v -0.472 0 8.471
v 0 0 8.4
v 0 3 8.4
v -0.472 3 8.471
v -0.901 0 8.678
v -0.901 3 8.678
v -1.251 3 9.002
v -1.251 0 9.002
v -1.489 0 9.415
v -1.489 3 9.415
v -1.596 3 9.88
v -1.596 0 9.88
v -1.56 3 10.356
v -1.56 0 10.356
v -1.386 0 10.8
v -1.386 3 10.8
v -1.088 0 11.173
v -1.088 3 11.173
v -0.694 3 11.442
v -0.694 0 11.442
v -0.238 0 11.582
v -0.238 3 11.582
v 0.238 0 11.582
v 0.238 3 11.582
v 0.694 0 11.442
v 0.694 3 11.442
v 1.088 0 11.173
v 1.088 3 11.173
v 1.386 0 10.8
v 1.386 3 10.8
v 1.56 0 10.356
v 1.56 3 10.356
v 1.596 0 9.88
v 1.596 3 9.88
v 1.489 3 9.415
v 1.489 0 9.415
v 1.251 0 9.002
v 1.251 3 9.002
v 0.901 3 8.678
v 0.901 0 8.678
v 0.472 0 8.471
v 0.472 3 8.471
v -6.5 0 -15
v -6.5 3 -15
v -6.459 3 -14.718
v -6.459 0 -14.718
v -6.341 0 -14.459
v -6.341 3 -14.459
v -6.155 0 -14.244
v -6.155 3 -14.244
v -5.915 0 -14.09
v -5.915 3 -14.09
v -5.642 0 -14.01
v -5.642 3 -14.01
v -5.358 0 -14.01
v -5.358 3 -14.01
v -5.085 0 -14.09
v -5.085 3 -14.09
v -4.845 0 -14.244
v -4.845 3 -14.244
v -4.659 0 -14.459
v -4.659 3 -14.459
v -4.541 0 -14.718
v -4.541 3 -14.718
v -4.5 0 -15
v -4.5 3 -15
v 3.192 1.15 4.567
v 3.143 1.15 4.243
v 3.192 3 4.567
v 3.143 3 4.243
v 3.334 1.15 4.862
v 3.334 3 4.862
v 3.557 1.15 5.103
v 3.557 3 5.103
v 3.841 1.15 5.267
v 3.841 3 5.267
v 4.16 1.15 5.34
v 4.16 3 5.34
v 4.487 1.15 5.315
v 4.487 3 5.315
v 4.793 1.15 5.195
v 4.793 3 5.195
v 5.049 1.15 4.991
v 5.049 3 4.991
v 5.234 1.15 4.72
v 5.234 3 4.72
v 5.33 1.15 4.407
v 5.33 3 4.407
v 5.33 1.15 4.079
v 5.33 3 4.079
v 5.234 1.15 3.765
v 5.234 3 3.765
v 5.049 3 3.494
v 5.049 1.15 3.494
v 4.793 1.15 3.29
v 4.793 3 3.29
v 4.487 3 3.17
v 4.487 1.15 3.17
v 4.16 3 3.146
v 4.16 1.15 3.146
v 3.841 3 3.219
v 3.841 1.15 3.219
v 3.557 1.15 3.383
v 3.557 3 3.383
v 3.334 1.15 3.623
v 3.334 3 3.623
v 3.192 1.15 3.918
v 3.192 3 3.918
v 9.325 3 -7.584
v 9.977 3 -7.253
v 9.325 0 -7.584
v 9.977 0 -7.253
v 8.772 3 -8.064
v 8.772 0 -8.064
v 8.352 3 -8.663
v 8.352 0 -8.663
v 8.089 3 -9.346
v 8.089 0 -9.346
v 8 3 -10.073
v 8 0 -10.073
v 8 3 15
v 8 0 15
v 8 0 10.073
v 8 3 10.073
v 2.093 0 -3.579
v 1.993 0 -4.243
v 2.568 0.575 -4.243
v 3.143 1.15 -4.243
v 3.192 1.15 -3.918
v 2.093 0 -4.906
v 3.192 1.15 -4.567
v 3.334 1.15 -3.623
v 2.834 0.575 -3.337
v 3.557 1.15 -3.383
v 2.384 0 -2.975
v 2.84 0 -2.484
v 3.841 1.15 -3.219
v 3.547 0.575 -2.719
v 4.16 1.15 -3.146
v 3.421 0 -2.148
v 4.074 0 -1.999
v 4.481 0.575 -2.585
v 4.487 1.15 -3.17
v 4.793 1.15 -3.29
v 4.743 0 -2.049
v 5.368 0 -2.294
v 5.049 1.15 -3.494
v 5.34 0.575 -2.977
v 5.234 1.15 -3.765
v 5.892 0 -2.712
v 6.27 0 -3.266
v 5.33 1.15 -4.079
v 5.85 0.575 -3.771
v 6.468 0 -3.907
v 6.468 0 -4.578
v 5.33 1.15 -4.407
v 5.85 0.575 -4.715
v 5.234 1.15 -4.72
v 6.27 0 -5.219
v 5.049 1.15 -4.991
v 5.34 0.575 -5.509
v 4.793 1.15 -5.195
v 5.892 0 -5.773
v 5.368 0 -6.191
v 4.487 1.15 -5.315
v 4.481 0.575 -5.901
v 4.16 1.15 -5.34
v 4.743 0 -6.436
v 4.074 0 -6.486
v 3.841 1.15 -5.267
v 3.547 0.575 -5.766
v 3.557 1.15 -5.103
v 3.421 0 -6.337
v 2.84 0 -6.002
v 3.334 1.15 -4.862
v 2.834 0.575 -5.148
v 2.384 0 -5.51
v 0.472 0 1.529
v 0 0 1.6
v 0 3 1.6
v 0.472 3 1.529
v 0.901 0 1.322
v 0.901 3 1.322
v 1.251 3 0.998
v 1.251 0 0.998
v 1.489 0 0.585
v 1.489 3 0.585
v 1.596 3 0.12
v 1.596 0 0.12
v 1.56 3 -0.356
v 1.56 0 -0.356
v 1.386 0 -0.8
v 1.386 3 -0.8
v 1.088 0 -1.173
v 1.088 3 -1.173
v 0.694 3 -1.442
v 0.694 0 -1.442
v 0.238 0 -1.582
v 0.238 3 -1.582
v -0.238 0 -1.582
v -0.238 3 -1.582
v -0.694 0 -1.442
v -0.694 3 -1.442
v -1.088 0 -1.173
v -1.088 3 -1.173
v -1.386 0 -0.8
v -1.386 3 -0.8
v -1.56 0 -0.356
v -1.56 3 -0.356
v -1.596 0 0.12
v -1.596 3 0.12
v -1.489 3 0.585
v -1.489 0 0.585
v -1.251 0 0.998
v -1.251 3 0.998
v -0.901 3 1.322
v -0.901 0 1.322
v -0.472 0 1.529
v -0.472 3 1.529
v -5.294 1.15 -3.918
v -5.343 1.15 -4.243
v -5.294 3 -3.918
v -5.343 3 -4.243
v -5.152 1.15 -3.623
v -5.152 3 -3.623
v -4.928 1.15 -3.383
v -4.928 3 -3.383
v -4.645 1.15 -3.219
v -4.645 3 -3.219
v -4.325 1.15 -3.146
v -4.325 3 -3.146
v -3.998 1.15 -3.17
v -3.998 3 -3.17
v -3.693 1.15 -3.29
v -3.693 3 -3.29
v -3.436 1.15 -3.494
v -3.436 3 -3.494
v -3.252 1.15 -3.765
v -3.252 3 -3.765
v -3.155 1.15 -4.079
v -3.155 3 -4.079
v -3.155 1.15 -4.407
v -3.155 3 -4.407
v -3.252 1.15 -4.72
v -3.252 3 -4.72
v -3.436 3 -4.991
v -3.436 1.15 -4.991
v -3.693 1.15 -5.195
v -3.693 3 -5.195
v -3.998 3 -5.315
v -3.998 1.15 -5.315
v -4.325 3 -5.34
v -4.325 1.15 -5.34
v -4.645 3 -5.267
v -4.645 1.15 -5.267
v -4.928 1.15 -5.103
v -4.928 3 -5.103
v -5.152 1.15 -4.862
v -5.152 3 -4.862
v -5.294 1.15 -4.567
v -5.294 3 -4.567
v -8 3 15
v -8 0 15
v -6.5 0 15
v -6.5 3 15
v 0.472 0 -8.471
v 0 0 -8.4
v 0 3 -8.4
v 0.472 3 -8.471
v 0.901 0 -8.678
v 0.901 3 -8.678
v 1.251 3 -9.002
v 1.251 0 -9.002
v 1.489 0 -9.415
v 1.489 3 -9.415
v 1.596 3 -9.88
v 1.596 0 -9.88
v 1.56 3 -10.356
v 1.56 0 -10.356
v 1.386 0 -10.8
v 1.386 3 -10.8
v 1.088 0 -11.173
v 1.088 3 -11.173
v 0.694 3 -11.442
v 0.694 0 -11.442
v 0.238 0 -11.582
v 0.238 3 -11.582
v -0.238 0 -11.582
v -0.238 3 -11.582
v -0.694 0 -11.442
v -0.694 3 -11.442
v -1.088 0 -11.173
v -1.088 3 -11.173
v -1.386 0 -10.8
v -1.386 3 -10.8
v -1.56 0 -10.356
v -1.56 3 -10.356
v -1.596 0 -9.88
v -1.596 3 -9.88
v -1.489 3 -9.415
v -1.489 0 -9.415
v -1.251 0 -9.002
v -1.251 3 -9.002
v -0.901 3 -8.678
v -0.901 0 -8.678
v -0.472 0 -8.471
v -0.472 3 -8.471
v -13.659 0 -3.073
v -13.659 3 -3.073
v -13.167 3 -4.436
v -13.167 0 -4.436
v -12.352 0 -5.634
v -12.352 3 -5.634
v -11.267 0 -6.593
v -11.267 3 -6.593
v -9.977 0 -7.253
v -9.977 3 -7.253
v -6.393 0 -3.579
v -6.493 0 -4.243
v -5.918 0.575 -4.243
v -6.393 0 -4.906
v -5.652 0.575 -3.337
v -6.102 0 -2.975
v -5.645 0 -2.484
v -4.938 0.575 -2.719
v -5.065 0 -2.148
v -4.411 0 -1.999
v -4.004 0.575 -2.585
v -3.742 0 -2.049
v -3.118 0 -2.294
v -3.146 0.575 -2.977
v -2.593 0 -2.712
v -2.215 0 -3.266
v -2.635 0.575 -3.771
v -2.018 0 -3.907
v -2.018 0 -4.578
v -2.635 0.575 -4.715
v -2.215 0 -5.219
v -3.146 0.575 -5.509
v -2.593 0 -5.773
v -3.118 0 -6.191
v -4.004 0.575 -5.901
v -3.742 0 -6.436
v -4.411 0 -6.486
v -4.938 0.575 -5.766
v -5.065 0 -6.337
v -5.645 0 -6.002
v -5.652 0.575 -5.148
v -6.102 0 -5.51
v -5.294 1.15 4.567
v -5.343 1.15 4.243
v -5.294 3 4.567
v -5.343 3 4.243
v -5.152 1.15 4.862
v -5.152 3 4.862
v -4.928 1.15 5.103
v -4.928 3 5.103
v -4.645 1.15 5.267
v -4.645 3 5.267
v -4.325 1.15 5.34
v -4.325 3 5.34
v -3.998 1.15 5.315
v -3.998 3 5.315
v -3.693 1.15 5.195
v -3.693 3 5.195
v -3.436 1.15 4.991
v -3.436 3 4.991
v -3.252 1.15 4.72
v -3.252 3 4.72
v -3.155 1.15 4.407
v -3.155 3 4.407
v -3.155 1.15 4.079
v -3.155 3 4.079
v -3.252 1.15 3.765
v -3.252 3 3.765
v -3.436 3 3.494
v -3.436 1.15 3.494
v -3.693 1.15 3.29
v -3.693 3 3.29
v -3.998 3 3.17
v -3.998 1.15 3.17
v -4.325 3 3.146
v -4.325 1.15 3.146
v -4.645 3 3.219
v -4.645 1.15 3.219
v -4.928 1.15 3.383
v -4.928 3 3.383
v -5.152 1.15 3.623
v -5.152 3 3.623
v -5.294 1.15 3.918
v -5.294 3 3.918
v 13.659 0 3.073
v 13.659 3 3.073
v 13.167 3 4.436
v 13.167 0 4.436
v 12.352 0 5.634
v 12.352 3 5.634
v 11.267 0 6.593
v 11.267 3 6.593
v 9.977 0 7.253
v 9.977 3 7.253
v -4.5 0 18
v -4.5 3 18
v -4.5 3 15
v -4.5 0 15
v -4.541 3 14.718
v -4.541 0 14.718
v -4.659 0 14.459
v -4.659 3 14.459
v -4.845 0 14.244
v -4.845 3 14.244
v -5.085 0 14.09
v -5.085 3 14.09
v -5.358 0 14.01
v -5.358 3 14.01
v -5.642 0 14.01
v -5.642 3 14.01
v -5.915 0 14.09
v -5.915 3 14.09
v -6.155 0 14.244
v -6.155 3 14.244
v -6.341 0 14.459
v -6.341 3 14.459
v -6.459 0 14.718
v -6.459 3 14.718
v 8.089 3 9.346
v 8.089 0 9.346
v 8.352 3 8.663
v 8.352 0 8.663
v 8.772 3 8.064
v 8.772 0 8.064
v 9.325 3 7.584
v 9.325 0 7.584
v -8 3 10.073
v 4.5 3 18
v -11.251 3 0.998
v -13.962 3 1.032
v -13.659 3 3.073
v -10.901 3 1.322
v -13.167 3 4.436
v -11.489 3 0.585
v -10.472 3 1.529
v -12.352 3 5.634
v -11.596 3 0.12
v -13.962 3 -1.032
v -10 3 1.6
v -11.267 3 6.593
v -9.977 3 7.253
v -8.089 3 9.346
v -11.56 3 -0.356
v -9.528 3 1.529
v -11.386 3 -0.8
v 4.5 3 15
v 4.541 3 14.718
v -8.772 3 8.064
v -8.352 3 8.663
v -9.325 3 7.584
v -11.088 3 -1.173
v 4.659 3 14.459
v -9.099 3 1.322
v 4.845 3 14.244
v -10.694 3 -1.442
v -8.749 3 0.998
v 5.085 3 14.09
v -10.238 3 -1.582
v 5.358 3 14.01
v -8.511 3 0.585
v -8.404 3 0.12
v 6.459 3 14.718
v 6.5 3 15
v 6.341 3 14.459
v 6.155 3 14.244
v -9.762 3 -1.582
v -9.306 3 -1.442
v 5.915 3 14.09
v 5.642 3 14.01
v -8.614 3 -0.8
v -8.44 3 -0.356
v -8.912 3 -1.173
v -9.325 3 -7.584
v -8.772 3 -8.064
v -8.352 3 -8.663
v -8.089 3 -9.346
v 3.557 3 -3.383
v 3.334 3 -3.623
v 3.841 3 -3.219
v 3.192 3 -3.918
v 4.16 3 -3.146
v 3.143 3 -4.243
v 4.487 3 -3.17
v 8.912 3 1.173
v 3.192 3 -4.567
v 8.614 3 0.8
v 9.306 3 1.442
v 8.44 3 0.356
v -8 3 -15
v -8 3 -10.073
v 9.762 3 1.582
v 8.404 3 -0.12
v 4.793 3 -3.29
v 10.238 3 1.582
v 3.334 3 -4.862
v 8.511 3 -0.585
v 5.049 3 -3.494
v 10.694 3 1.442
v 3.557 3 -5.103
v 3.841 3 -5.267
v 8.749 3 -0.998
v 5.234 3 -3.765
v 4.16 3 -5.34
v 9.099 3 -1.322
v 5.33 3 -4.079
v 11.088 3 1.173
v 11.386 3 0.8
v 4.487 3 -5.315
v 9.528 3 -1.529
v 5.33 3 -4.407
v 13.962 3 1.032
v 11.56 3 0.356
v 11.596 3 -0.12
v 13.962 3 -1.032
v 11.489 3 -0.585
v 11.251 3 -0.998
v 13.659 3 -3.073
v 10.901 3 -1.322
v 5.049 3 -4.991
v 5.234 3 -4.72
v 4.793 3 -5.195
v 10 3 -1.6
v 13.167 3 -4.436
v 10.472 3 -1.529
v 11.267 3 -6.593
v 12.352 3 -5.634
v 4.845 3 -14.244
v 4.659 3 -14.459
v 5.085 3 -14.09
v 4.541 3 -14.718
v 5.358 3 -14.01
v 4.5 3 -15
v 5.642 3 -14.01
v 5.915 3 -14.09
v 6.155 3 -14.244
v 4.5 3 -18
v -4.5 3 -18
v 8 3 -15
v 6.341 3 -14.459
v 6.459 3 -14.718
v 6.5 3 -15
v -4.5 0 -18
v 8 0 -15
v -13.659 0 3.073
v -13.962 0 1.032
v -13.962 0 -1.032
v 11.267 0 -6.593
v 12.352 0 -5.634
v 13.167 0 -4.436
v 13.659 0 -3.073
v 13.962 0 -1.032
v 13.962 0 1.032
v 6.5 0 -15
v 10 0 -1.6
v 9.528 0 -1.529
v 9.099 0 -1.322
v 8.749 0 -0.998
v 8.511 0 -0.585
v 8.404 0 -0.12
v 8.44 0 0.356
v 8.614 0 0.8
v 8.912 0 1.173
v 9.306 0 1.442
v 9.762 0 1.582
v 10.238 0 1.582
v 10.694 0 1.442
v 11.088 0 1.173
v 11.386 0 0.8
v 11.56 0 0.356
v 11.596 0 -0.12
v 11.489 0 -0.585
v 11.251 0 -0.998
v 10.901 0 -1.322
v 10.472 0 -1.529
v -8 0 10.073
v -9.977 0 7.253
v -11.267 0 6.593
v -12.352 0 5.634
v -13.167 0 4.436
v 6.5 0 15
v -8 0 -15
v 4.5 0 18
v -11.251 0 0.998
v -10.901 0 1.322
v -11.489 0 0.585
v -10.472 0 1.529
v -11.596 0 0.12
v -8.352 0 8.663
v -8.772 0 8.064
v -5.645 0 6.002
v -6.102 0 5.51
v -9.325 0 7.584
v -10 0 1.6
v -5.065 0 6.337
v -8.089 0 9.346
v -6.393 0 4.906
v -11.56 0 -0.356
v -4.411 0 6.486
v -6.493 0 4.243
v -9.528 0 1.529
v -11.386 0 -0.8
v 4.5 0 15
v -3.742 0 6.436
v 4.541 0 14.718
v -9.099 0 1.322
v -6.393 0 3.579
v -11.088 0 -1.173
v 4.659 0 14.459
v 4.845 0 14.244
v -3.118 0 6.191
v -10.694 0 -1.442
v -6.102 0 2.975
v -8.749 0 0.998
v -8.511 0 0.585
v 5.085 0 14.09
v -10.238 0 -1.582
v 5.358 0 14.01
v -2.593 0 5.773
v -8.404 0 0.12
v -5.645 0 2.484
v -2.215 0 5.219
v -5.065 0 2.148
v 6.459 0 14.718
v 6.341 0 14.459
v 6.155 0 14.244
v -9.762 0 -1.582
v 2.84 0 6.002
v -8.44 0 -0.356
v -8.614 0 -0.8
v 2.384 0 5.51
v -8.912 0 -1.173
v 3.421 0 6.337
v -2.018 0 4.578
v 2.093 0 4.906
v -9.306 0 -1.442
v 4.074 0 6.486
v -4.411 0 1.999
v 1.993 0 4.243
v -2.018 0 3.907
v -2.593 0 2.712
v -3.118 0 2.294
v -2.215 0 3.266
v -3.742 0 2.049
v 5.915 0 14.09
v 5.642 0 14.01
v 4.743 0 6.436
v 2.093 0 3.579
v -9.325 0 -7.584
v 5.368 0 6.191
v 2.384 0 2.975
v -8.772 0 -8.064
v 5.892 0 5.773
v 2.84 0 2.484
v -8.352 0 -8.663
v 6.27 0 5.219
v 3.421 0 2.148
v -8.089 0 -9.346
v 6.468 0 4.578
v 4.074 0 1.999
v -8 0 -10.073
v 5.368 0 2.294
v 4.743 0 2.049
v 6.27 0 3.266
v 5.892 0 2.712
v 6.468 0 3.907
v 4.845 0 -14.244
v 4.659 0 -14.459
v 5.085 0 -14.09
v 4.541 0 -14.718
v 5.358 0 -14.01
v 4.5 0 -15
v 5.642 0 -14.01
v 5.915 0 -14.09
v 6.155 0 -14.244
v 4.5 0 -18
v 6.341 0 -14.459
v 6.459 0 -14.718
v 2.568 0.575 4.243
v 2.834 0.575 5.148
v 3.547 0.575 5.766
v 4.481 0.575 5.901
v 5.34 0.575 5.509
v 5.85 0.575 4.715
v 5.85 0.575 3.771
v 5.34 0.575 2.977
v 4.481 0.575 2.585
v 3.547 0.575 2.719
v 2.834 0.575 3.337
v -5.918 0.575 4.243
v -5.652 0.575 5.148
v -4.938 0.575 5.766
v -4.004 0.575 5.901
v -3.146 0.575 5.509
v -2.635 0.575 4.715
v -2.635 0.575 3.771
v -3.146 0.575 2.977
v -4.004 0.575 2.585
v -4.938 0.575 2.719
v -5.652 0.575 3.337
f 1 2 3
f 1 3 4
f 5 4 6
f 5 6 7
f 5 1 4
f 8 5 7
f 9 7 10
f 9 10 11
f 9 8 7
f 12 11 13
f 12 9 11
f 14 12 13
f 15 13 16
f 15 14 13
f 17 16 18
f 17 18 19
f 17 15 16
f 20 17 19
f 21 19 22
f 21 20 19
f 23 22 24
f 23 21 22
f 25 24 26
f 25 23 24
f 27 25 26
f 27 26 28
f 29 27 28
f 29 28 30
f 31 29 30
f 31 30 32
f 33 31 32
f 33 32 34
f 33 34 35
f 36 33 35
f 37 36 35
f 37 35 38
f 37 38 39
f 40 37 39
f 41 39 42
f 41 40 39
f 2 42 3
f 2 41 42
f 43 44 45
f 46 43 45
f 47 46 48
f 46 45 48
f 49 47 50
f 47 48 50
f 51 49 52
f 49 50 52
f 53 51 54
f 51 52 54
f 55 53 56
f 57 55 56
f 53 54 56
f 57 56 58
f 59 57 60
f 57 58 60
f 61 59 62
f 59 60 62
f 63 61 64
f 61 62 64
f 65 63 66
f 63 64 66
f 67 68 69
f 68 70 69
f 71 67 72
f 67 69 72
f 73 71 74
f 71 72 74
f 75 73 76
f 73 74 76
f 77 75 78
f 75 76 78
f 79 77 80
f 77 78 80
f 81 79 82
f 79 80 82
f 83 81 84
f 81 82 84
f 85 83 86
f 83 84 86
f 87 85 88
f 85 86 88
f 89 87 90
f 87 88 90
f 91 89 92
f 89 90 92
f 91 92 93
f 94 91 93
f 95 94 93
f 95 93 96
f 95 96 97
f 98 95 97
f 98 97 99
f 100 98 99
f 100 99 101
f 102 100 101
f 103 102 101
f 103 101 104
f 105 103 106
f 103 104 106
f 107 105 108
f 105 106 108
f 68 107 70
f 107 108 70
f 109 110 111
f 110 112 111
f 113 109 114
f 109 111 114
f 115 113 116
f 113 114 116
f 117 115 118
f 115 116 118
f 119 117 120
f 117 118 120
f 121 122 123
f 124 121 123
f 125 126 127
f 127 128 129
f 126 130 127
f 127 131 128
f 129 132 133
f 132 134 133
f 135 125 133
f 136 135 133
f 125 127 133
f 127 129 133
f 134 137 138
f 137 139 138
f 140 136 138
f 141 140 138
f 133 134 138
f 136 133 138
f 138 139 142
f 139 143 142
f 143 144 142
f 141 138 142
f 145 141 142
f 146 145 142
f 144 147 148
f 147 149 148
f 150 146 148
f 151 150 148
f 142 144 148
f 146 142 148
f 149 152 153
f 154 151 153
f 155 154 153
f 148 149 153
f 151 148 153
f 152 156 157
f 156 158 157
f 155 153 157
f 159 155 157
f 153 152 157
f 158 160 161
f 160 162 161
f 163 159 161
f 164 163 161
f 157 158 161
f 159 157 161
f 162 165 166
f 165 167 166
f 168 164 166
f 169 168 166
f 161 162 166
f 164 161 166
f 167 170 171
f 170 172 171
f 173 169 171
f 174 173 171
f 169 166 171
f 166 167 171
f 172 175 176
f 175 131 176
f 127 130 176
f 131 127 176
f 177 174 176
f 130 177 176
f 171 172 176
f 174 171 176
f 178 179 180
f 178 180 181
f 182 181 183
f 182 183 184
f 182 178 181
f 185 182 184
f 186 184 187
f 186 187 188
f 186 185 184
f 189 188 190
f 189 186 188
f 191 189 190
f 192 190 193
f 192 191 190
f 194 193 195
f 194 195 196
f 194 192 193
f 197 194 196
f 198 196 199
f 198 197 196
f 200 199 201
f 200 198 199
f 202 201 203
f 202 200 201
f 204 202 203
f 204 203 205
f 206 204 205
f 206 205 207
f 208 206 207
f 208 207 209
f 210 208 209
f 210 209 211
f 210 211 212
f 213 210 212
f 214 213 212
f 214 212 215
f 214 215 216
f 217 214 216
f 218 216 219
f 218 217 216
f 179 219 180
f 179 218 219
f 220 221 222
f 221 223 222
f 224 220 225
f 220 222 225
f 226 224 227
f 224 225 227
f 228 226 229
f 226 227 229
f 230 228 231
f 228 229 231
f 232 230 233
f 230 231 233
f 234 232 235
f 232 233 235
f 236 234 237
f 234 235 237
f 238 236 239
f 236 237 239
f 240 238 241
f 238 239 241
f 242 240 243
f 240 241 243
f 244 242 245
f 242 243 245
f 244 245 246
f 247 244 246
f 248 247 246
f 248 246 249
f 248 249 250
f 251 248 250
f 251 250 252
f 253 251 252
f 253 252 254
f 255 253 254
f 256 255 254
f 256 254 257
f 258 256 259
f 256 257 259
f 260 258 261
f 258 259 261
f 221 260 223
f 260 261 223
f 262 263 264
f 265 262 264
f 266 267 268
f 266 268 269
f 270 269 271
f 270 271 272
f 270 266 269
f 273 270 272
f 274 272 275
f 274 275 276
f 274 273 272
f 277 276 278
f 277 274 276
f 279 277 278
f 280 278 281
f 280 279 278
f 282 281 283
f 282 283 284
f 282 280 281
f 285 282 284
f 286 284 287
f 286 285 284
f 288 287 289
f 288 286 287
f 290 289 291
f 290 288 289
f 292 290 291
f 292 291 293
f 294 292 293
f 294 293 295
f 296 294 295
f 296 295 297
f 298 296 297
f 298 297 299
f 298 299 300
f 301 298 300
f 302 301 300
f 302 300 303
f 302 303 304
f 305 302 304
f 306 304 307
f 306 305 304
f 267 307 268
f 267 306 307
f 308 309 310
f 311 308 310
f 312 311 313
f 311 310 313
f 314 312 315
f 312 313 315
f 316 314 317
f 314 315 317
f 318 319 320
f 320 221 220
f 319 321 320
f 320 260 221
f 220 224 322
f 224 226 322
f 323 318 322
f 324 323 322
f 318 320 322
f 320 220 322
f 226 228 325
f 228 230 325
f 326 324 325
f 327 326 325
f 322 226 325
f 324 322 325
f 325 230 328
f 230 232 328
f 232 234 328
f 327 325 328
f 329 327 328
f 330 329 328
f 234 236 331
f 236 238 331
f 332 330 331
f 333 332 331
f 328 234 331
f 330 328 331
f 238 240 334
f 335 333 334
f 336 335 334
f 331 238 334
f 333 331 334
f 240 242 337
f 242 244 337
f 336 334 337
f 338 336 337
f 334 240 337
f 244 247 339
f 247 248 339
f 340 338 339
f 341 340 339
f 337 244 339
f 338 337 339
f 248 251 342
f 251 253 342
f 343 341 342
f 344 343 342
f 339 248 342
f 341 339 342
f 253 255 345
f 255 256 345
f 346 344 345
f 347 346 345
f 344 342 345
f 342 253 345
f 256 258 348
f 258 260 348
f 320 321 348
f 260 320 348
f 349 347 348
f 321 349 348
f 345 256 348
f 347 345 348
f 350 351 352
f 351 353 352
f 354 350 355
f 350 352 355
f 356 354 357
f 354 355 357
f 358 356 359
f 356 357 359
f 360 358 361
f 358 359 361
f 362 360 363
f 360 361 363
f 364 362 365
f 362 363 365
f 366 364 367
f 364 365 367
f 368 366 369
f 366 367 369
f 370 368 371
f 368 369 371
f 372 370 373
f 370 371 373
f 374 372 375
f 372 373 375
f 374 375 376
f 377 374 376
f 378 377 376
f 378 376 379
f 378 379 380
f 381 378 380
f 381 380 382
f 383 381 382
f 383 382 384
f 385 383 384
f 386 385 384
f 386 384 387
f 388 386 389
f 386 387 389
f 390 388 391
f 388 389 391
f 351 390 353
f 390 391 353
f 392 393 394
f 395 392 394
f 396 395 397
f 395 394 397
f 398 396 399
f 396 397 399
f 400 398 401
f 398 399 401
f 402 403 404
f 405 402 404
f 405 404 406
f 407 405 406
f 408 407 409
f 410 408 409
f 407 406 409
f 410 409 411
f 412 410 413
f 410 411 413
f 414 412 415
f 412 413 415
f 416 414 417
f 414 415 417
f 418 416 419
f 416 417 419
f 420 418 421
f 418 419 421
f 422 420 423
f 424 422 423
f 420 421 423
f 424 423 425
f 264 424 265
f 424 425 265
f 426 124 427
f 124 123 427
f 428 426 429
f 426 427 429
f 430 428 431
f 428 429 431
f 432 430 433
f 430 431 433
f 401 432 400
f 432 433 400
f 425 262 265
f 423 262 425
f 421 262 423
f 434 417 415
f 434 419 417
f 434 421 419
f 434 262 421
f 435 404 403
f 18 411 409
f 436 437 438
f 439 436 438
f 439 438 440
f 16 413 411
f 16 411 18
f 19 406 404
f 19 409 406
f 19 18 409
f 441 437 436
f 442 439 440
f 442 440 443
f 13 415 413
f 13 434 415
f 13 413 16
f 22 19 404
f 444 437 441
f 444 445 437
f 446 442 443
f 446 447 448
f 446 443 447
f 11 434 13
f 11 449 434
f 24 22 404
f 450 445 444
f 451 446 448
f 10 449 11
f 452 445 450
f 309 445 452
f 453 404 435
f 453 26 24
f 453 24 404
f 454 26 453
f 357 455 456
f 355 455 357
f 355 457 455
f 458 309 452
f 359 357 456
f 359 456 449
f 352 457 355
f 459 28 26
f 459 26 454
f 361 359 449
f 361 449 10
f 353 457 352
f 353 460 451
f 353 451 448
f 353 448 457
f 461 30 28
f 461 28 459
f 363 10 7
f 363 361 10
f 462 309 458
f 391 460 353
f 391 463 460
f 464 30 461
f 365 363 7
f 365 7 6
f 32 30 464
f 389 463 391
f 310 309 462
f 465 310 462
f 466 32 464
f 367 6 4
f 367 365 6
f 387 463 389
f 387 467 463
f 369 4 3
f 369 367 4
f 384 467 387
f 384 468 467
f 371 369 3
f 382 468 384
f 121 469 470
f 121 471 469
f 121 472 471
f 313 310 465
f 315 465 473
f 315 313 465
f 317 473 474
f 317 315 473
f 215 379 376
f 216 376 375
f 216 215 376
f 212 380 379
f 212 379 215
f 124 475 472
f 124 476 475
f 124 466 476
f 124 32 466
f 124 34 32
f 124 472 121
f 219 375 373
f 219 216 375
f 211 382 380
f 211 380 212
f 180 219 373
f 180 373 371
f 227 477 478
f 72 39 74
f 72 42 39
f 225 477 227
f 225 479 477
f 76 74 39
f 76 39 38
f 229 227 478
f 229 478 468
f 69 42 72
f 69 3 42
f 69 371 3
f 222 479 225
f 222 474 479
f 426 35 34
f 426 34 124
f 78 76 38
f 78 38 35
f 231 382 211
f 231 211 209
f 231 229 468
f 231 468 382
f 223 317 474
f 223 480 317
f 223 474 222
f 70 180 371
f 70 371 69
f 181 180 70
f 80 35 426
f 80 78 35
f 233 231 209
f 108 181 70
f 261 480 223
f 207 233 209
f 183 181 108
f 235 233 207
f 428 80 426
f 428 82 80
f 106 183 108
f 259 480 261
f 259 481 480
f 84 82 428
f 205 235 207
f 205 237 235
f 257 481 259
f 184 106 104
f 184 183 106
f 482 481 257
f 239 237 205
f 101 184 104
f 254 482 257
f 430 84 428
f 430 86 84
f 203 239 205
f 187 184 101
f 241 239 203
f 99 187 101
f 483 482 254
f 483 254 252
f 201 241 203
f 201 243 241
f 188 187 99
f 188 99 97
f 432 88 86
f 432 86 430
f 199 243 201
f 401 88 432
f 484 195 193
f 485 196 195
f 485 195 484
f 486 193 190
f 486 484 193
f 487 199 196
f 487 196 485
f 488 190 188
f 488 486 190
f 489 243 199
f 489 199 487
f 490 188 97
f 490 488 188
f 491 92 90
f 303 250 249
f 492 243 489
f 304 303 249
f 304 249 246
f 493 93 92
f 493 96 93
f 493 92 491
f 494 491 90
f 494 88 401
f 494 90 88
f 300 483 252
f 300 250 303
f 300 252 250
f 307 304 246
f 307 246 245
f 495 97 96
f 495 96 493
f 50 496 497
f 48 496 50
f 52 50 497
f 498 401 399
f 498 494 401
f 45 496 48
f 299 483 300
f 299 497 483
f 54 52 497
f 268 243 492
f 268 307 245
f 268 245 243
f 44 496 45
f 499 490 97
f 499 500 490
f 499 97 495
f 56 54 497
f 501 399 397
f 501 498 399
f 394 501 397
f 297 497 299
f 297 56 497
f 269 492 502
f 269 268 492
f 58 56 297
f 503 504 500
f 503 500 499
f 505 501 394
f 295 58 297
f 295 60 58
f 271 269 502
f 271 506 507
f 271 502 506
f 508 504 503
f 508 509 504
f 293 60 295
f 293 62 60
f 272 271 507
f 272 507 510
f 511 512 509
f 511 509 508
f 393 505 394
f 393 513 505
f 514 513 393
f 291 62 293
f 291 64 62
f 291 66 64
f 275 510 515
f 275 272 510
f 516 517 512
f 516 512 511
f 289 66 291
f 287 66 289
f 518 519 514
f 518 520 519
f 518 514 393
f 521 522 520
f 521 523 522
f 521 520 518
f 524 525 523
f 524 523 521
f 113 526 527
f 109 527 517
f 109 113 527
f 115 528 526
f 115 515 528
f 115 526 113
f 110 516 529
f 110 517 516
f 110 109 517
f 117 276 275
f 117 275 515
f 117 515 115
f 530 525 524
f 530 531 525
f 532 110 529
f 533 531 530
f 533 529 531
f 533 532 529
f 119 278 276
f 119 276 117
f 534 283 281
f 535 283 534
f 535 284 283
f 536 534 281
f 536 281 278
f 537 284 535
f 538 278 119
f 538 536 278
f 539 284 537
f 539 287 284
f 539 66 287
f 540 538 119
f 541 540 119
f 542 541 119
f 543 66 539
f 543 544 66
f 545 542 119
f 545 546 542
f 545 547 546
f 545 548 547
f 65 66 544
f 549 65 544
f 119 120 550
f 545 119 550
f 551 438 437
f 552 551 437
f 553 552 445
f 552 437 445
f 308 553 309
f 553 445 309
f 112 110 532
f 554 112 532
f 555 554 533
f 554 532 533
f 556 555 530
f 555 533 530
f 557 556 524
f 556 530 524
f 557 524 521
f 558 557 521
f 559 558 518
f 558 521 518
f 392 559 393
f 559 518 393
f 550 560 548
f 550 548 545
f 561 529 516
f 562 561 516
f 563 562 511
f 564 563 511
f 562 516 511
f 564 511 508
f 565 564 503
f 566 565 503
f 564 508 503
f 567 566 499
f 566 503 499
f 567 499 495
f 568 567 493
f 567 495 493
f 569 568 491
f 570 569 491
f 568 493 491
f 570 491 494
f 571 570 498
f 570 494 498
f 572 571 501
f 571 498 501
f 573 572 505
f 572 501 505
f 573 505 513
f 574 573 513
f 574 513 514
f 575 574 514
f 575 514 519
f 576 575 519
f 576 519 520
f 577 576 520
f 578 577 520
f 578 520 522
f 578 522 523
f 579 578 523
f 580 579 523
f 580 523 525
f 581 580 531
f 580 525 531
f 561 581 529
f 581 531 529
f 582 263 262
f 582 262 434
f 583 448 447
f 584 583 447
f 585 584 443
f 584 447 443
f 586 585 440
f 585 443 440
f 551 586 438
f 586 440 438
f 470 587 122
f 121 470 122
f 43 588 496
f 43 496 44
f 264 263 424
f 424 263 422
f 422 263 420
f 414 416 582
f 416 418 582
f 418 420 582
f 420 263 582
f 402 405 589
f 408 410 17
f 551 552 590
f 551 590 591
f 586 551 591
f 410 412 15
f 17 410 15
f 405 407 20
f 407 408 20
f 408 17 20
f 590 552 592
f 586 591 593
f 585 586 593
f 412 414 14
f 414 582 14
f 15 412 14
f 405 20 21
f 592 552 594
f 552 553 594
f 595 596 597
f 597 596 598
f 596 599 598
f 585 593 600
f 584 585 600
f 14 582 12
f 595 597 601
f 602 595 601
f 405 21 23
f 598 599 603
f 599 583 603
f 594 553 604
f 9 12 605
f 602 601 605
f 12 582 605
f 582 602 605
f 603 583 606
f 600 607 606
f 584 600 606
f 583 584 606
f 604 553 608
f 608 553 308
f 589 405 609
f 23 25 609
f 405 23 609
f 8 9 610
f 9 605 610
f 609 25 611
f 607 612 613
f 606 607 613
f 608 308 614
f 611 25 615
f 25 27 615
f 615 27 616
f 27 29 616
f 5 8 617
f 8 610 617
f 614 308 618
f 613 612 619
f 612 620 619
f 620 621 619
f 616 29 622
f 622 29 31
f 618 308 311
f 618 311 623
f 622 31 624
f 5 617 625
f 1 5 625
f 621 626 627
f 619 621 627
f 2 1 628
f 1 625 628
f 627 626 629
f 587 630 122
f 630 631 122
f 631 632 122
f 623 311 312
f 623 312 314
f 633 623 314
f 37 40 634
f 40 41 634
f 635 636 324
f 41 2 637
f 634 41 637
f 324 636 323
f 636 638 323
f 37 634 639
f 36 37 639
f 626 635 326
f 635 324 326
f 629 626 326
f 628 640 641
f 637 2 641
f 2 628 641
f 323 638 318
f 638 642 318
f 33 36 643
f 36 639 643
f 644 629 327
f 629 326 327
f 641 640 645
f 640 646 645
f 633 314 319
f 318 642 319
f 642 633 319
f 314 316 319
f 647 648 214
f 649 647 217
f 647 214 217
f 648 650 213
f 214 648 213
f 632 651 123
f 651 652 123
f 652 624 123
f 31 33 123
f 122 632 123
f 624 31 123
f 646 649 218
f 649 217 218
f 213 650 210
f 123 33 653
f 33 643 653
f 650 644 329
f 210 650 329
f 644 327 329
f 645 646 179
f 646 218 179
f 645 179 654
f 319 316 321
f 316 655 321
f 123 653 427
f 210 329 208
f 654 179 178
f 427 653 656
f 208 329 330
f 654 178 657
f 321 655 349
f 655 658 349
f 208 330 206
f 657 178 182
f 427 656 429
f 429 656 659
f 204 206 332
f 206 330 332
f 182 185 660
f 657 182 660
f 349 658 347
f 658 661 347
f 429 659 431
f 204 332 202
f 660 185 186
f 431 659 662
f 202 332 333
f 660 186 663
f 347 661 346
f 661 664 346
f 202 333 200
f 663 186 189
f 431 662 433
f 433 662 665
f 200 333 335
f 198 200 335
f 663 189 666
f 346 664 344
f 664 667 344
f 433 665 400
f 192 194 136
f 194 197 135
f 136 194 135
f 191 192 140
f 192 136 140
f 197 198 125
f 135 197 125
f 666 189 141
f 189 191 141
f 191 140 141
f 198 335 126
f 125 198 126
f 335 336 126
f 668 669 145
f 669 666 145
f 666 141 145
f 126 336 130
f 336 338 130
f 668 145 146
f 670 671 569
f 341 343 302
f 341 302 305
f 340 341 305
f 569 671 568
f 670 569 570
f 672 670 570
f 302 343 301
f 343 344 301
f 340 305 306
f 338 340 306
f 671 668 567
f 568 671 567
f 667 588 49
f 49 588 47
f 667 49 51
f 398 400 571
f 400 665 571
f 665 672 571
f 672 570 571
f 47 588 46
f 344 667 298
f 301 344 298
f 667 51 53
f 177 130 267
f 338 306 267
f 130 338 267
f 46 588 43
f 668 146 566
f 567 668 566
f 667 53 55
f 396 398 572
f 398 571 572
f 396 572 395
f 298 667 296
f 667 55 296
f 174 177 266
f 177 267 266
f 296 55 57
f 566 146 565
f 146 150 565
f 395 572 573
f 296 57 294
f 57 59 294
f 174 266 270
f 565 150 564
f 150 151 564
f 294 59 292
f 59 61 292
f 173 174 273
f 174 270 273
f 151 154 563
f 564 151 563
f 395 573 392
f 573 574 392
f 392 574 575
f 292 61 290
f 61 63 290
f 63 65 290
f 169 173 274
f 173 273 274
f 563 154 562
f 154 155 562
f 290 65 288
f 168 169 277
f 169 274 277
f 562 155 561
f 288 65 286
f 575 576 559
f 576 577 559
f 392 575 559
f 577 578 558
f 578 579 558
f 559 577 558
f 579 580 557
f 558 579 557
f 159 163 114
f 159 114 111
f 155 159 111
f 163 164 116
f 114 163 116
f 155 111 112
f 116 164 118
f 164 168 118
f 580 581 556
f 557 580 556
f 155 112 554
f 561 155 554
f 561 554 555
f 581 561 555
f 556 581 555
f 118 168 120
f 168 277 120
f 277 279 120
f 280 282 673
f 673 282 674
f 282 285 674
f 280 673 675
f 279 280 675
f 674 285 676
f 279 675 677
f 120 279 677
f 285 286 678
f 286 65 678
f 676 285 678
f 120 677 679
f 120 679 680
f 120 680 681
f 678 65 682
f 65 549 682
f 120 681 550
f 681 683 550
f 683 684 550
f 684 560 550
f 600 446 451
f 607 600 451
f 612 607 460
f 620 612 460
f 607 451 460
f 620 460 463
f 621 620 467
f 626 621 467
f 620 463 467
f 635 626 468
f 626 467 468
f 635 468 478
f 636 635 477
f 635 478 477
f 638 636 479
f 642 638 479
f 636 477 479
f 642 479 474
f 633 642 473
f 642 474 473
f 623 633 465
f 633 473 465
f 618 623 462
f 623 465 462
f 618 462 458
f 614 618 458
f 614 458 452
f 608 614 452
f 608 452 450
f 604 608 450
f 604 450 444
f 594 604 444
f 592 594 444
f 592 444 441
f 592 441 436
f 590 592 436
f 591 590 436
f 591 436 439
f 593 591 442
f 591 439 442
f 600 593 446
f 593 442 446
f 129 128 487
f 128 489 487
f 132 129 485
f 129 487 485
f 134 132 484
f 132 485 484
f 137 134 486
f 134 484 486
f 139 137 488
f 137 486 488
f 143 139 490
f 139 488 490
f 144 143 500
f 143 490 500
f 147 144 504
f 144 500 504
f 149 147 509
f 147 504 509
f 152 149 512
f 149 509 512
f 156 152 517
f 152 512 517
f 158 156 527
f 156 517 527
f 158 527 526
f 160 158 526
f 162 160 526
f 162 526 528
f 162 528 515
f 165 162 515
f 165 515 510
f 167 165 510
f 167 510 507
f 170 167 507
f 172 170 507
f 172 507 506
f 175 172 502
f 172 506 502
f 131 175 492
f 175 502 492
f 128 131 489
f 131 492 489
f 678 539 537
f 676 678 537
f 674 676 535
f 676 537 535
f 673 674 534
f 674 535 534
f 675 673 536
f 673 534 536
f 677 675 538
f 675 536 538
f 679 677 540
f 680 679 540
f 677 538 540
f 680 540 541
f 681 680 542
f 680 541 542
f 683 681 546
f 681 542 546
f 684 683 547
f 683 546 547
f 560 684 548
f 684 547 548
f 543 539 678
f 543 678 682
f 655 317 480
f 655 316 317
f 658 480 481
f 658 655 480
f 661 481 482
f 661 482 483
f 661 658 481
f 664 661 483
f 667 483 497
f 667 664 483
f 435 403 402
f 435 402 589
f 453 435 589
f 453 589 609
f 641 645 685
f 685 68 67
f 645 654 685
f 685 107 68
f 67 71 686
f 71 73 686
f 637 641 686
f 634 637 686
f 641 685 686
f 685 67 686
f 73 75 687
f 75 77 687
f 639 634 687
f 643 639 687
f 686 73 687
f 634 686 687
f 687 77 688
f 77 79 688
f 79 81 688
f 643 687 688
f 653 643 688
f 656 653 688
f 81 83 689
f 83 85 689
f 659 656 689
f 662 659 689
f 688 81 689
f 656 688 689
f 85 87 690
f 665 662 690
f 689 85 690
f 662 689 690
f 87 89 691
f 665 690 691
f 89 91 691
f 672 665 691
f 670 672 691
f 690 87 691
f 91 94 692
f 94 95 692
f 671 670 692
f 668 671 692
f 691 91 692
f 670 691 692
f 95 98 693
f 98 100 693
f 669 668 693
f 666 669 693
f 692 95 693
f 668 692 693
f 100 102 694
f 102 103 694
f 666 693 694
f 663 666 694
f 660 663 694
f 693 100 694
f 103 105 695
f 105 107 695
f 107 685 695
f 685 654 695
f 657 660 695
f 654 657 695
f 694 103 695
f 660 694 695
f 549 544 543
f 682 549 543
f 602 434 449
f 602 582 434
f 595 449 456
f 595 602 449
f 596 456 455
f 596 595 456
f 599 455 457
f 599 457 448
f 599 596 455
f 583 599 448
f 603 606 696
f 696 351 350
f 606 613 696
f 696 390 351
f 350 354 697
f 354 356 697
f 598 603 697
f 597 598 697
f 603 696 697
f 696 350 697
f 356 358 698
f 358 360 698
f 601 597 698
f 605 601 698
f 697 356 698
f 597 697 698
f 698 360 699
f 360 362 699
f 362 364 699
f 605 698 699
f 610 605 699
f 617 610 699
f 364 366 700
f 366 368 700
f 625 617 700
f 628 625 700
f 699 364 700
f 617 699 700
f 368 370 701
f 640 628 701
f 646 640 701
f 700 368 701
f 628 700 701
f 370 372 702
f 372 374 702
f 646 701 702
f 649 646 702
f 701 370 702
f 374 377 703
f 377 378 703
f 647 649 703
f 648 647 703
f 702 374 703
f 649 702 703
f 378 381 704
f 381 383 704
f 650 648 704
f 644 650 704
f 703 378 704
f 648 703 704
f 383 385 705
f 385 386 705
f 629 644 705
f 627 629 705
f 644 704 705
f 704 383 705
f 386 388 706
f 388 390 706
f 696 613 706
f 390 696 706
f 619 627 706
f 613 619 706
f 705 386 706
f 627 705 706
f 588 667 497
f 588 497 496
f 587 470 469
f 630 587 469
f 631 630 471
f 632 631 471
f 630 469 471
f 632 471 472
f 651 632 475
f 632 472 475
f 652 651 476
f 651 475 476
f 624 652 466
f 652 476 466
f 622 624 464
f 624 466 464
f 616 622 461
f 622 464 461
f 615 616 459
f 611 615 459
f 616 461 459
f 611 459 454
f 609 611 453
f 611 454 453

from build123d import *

# Parameters (mm, degrees)
SKETCH_1_W                = 16
SKETCH_1_H                = 30
SKETCH_1_R                = 1.6
EXTRUDE_1_DEPTH           = 3
SKETCH_2_W                = 9
SKETCH_2_H                = 3
EXTRUDE_2_DEPTH           = 3
SKETCH_3_R                = 1
CUT_EXTRUDE_1_DEPTH       = 20.924858845
SKETCH_4_R                = 1.6
EXTRUDE_3_DEPTH           = 3
SKETCH_8_R                = 1
CUT_EXTRUDE_3_DEPTH       = 24
FILLET_1_R                = 3
HOLE_WIZARD_1_D           = 2.2
HOLE_WIZARD_1_CSINK_D     = 4.5
HOLE_WIZARD_1_CSINK_ANGLE = 90


with BuildPart() as part:
    # 草图1 → 凸台-拉伸1 (new body)
    with BuildSketch(Plane(origin=(0, 0, 0), x_dir=(1, 0, 0), z_dir=(0, 1, 0))):
        Rectangle(SKETCH_1_W, SKETCH_1_H)
        with Locations(Location((0, 0, 0), (0, 0, 270))):
            Circle(SKETCH_1_R, mode=Mode.SUBTRACT)
        with Locations(Location((0, 10, 0), (0, 0, 270))):
            Circle(SKETCH_1_R, mode=Mode.SUBTRACT)
        with Locations(Location((0, -10, 0), (0, 0, 90))):
            Circle(SKETCH_1_R, mode=Mode.SUBTRACT)
    extrude(amount=EXTRUDE_1_DEPTH)

    # 草图2 → 凸台-拉伸2 (add)
    with BuildSketch(Plane(origin=(0, 3, 0), x_dir=(1, 0, 0), z_dir=(0, 1, 0))):
        with Locations((0, 16.5)):
            Rectangle(SKETCH_2_W, SKETCH_2_H)
        with Locations((0, -16.5)):
            Rectangle(SKETCH_2_W, SKETCH_2_H)
    extrude(amount=-EXTRUDE_2_DEPTH)

    # 草图3 → 切除-拉伸1 (cut, through all)
    with BuildSketch(Plane(origin=(0, 3, 0), x_dir=(1, 0, 0), z_dir=(0, 1, 0))):
        with Locations((-5.5, 15)):
            Circle(SKETCH_3_R)
        with Locations((5.5, 15)):
            Circle(SKETCH_3_R)
        with Locations((5.5, -15)):
            Circle(SKETCH_3_R)
        with Locations((-5.5, -15)):
            Circle(SKETCH_3_R)
    extrude(amount=-CUT_EXTRUDE_1_DEPTH, mode=Mode.SUBTRACT)

    # 草图4 → 凸台-拉伸3 (add)
    # profile 1 of 2: a face of its own
    with BuildSketch(Plane(origin=(0, 3, 0), x_dir=(1, 0, 0), z_dir=(0, 1, 0))):
        with BuildLine():
            Line((8, -7.6), (8, 7.6))
            ThreePointArc((8, 7.6), (11.623231276, 6.329039095), (13.658536585, 3.073170732))
            ThreePointArc((13.658536585, 3.073170732), (14, 0), (13.658536585, -3.073170732))
            ThreePointArc((13.658536585, -3.073170732), (11.623231276, -6.329039095), (8, -7.6))
        make_face()
        with Locations(Location((10, 0, 0), (0, 0, 90))):
            Circle(SKETCH_4_R, mode=Mode.SUBTRACT)
    # profile 2 of 2: a face of its own
    with BuildSketch(Plane(origin=(0, 3, 0), x_dir=(1, 0, 0), z_dir=(0, 1, 0))):
        with BuildLine():
            Line((-8, 7.6), (-8, -7.6))
            ThreePointArc((-8, -7.6), (-11.623231276, -6.329039095), (-13.658536585, -3.073170732))
            ThreePointArc((-13.658536585, -3.073170732), (-14, 0), (-13.658536585, 3.073170732))
            ThreePointArc((-13.658536585, 3.073170732), (-11.623231276, 6.329039095), (-8, 7.6))
        make_face()
        with Locations(Location((-10, 0, 0), (0, 0, 270))):
            Circle(SKETCH_4_R, mode=Mode.SUBTRACT)
    extrude(amount=-EXTRUDE_3_DEPTH)

    # 草图8 → 切除-拉伸3 (cut, through all)
    with BuildSketch(Plane(origin=(0, 3, 0), x_dir=(1, 0, 0), z_dir=(0, 1, 0))):
        with Locations(Location((-4.242640687, 4.242640687, 0), (0, 0, 270))):
            Circle(SKETCH_8_R)
        with Locations(Location((4.242640687, 4.242640687, 0), (0, 0, 270))):
            Circle(SKETCH_8_R)
        with Locations(Location((4.242640687, -4.242640687, 0), (0, 0, 270))):
            Circle(SKETCH_8_R)
        with Locations(Location((-4.242640687, -4.242640687, 0), (0, 0, 270))):
            Circle(SKETCH_8_R)
    extrude(amount=-CUT_EXTRUDE_3_DEPTH, mode=Mode.SUBTRACT)

    # 圆角1
    fillet_1_edges = [part.edges().sort_by_distance(p)[0] for p in [
        (-8, 1.5, 7.6),
        (-8, 1.5, -7.6),
        (8, 1.5, 7.6),
        (8, 1.5, -7.6),
    ]]
    fillet(fillet_1_edges, radius=FILLET_1_R)

    # 打孔尺寸(%根据十字)槽沉头木螺钉的类型1 (through all)
    with Locations(Plane.XZ):
        with Locations((-4.242640687, -4.242640687), (4.242640687, -4.242640687), (-4.242640687, 4.242640687), (4.242640687, 4.242640687)):
            CounterSinkHole(HOLE_WIZARD_1_D / 2, HOLE_WIZARD_1_CSINK_D / 2, counter_sink_angle=HOLE_WIZARD_1_CSINK_ANGLE)


solid = part.part
